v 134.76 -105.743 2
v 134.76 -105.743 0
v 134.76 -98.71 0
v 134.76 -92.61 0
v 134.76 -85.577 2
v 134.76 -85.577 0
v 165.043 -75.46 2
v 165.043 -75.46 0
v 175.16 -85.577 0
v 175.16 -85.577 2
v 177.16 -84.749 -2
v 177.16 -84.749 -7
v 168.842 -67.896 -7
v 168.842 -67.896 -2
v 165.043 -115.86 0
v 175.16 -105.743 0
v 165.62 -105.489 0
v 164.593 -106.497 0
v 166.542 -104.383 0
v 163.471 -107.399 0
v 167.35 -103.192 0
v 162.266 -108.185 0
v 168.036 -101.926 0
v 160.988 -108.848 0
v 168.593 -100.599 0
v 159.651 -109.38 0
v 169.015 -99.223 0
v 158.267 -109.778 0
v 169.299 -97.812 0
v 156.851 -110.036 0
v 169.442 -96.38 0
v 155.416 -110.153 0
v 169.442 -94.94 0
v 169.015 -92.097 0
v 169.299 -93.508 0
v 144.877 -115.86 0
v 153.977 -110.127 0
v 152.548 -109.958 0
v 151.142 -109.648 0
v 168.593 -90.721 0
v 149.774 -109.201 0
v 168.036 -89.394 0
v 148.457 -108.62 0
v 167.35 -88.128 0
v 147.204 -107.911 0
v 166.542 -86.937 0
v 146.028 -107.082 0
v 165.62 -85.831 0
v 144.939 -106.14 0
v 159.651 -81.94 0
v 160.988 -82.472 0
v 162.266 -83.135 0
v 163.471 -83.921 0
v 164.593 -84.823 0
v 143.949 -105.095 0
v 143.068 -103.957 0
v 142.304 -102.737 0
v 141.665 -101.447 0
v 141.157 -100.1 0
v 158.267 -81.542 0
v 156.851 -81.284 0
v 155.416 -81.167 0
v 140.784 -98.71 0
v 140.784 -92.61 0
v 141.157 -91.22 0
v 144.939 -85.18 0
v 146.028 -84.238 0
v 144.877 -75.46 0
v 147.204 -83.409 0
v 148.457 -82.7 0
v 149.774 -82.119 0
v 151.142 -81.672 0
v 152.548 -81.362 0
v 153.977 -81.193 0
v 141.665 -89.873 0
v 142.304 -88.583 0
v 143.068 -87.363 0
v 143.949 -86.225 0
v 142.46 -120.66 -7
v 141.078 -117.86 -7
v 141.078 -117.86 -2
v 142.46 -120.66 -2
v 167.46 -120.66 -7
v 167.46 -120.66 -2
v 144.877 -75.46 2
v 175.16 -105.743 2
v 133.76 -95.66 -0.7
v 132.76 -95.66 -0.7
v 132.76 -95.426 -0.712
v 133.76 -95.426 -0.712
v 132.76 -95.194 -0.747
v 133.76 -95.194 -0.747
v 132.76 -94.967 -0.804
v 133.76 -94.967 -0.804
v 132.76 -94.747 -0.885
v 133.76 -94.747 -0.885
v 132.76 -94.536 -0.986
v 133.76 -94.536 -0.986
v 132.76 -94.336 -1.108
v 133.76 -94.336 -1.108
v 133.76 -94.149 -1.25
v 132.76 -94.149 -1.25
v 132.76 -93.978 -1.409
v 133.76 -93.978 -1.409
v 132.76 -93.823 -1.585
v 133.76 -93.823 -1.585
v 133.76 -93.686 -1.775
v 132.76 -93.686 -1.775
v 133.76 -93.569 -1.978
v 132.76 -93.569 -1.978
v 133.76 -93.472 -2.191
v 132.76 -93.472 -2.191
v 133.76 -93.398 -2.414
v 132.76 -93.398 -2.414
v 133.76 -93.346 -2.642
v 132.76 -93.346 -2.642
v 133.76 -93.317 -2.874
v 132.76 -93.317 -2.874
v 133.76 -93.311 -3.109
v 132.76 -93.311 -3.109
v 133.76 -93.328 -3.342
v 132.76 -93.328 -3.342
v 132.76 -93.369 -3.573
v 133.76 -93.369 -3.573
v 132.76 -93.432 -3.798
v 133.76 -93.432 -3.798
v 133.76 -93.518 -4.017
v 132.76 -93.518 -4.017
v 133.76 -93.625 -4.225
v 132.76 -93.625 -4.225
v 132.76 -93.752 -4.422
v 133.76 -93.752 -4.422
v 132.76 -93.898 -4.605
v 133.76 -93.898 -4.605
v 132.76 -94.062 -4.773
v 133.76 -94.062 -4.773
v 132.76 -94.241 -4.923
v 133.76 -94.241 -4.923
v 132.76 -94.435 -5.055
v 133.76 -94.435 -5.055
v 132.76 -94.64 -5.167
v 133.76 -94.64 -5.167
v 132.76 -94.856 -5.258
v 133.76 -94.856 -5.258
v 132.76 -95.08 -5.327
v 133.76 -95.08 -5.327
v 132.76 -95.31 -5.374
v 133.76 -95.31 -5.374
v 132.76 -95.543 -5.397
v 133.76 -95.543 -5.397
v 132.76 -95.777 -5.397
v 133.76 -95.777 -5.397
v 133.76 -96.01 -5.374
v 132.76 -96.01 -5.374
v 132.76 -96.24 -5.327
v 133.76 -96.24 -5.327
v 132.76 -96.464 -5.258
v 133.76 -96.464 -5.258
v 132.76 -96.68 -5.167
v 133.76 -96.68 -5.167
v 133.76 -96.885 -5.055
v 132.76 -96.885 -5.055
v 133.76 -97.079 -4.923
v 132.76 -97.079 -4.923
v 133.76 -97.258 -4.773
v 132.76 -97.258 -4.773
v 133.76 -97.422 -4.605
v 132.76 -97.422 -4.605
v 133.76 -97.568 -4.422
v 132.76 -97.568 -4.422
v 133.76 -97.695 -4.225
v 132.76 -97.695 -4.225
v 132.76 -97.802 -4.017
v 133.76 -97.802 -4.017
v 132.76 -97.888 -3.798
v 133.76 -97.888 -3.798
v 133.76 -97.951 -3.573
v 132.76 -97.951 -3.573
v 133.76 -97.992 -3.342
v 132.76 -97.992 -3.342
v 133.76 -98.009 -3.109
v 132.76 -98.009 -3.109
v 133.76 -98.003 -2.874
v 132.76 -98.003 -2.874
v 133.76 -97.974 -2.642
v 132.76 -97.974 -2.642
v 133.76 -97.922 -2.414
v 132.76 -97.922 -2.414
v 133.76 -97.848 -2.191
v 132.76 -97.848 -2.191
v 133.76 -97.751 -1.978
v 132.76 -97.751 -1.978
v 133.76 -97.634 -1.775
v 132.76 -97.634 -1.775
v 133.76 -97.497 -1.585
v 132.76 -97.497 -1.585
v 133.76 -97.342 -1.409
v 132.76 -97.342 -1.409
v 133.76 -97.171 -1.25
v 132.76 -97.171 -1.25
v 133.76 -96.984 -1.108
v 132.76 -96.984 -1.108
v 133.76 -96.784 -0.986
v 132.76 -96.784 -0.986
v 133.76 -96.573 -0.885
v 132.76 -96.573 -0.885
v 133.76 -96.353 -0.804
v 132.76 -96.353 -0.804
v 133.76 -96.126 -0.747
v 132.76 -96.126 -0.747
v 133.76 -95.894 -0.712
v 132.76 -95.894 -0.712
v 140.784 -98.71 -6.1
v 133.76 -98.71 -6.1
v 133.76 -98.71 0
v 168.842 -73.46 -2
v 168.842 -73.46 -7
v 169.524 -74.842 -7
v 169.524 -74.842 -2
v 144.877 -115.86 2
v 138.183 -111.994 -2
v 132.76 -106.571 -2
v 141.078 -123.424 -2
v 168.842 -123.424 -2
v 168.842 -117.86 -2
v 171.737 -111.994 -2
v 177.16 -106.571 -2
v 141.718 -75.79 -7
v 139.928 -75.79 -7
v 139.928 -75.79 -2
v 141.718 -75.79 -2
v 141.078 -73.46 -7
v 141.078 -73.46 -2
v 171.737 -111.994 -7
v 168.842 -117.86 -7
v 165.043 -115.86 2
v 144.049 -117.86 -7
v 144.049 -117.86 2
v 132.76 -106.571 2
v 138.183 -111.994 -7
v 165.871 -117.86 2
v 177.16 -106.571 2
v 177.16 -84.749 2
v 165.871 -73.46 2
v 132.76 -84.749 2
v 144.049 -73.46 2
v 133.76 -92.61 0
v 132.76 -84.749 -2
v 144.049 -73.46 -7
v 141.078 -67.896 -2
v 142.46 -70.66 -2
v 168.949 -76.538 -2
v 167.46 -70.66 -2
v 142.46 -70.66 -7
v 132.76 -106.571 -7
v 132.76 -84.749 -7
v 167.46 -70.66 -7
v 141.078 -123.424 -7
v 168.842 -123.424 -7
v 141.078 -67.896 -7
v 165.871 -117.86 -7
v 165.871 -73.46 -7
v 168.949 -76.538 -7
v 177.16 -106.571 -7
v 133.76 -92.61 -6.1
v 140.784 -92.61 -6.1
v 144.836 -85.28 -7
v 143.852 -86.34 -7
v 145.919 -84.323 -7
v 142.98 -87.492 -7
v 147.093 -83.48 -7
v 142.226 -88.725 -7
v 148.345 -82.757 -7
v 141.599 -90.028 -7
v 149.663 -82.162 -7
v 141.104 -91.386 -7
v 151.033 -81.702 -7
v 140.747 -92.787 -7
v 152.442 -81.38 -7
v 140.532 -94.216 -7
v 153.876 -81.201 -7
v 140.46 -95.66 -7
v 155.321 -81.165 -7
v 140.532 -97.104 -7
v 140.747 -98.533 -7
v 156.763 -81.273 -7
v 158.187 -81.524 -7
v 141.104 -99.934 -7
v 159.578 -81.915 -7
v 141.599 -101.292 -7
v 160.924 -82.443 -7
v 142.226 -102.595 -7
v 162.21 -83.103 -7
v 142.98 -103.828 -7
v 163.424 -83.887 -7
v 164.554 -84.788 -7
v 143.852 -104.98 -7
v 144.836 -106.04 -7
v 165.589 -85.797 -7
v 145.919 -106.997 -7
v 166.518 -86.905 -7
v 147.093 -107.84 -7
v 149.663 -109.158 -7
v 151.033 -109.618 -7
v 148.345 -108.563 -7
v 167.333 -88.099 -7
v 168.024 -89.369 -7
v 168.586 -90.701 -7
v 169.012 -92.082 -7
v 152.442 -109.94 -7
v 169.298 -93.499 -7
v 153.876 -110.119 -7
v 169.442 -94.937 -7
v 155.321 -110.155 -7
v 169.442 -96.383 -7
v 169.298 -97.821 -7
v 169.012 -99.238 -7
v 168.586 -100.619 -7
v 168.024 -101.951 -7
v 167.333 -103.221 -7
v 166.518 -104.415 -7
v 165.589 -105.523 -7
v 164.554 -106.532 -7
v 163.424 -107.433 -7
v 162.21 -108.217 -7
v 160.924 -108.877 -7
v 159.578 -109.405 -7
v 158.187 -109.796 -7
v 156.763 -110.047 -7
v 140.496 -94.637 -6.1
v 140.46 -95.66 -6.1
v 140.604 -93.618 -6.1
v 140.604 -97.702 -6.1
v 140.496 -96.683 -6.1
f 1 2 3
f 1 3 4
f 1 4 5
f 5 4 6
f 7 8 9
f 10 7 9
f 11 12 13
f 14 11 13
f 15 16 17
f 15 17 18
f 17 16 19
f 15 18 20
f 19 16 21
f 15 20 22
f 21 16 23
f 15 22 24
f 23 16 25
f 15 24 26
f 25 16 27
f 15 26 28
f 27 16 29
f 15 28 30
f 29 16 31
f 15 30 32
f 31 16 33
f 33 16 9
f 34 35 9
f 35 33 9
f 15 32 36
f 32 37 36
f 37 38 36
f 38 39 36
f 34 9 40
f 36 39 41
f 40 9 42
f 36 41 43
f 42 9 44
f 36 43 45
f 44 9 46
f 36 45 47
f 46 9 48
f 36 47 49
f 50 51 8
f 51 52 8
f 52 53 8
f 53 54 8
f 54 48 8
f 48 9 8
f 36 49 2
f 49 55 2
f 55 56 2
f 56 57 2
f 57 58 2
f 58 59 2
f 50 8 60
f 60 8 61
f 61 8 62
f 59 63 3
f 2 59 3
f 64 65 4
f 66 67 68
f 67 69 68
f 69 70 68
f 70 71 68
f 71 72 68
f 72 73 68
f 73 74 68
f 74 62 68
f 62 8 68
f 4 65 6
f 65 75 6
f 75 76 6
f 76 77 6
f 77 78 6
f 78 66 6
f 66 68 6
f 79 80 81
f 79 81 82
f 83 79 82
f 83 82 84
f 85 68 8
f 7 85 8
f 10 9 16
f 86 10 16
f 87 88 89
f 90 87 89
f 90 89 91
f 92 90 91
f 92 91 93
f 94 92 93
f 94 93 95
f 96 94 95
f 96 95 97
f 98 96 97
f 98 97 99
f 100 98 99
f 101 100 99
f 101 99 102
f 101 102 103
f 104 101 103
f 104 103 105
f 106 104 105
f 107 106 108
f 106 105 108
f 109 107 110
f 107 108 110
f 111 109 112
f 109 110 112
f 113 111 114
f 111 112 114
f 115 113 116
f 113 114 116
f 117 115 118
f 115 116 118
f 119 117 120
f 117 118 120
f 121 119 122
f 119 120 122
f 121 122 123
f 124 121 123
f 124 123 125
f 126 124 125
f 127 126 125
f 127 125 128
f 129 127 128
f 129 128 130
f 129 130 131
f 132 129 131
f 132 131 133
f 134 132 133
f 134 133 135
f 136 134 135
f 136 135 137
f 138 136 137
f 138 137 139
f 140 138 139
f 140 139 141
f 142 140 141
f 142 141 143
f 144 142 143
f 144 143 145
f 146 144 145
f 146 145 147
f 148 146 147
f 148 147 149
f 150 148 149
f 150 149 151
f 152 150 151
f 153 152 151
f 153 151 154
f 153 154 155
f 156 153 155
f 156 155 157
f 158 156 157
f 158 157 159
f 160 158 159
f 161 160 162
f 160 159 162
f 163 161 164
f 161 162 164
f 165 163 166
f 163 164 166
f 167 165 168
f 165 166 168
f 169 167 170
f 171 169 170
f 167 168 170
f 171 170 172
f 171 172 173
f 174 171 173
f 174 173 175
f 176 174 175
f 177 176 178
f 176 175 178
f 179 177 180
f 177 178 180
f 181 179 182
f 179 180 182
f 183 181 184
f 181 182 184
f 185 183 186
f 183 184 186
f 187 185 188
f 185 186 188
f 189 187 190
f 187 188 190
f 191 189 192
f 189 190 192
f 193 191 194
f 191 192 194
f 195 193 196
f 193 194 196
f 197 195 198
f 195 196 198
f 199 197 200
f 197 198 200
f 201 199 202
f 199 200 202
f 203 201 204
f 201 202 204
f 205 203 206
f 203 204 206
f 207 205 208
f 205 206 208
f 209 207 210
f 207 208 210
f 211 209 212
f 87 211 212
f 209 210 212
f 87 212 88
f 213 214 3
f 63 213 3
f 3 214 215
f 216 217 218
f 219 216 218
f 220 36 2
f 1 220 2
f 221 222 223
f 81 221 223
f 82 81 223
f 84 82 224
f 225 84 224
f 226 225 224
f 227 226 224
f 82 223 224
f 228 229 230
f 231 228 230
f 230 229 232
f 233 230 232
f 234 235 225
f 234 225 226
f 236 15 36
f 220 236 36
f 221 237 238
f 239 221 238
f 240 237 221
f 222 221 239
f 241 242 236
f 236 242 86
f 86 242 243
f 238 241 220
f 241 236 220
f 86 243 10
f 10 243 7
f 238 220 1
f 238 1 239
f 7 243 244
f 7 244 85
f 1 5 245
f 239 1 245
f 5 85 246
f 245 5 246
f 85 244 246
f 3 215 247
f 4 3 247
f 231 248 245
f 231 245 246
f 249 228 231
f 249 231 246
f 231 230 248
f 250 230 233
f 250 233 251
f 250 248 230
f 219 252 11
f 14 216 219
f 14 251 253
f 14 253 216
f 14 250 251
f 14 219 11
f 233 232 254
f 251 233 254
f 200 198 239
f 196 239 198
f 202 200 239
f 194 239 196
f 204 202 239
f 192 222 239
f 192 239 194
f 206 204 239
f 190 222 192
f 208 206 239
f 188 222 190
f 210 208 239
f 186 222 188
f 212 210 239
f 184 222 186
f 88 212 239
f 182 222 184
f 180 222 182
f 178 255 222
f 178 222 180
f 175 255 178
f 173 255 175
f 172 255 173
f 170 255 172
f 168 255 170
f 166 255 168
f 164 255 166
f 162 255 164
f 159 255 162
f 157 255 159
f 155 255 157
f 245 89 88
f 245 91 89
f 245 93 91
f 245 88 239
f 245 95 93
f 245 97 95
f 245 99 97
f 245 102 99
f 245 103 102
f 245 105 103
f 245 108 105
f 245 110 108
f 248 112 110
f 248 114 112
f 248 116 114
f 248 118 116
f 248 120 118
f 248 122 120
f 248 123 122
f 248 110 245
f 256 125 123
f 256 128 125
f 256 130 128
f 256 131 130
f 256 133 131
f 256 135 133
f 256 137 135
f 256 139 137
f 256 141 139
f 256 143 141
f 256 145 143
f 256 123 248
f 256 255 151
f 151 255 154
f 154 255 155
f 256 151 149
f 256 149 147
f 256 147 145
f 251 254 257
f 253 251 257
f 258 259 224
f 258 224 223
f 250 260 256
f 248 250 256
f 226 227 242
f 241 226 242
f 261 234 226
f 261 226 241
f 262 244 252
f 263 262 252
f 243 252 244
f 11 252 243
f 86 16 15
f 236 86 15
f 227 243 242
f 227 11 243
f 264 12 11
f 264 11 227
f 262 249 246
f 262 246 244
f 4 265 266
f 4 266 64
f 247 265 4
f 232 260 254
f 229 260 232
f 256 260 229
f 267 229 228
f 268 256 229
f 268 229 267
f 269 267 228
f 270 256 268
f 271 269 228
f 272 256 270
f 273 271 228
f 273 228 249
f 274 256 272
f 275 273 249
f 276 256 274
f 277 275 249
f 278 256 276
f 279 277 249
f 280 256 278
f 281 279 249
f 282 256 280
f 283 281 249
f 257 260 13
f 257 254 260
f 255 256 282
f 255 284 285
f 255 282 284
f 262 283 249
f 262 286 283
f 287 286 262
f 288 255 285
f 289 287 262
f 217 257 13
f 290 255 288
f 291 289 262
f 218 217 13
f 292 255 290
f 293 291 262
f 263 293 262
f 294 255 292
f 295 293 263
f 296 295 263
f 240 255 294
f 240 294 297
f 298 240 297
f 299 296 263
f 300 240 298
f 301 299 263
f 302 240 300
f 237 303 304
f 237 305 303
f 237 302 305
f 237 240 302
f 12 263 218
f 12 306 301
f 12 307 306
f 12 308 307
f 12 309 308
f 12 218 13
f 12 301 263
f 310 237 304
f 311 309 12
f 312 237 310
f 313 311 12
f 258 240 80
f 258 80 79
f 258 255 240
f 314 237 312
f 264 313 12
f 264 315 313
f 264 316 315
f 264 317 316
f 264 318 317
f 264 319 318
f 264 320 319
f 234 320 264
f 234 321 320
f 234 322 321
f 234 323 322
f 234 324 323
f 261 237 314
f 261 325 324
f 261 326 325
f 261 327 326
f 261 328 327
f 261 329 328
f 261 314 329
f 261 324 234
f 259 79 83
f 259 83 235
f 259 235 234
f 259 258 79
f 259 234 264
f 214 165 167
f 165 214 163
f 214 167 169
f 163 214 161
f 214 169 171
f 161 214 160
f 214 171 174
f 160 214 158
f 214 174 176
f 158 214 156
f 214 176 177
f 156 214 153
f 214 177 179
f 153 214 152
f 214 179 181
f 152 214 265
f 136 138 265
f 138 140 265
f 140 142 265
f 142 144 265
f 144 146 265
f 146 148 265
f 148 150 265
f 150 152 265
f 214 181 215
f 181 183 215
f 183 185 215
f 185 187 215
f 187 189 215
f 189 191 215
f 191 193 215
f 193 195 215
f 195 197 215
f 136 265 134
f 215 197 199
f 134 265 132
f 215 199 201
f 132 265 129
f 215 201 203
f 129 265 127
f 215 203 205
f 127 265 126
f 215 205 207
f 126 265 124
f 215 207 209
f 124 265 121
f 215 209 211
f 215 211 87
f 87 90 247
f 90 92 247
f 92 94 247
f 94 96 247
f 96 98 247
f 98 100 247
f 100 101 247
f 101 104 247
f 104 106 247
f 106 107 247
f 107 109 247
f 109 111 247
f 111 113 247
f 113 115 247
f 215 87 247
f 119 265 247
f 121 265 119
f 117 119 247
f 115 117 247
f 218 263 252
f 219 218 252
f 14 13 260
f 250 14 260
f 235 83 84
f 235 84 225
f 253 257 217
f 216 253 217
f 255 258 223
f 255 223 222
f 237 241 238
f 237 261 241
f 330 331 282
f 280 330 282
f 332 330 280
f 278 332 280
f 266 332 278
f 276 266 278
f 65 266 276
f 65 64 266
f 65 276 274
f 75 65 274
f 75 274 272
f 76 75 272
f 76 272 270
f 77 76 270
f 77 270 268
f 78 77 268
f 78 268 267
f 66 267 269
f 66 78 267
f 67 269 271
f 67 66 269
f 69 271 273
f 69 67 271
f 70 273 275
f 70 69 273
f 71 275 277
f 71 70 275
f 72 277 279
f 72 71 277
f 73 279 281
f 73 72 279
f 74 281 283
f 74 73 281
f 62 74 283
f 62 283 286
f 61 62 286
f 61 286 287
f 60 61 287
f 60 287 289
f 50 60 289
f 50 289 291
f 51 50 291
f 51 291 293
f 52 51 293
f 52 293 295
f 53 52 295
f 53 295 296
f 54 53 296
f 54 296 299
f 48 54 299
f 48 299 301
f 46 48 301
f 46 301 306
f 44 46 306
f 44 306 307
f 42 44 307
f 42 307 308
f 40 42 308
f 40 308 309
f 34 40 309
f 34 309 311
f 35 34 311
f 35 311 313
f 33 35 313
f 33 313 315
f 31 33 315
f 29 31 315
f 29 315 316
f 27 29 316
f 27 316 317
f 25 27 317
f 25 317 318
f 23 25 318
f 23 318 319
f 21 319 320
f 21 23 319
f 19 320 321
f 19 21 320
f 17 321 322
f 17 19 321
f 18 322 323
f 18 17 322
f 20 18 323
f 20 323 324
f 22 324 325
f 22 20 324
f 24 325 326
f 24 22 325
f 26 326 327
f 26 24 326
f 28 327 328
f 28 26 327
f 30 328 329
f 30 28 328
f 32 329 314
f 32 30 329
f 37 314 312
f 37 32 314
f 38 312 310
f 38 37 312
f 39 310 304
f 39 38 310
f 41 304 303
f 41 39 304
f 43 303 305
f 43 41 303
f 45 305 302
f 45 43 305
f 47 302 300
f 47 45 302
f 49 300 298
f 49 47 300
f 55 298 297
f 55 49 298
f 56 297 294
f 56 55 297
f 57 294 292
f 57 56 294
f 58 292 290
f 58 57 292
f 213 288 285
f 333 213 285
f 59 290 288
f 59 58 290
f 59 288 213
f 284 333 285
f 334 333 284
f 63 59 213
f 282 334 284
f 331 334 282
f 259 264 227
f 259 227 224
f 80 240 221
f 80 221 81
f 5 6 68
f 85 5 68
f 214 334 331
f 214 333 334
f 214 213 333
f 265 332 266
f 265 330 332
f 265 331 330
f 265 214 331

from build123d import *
from OCP.BRepFilletAPI import BRepFilletAPI_MakeChamfer

# Parameters (mm, degrees)
SKETCH1_R               = 14.5
BOSS_EXTRUDE1_DEPTH     = 7
BOSS_EXTRUDE2_DEPTH     = 2
BOSS_EXTRUDE3_DEPTH     = 5
CHAMFER1_SIZE           = 5
CHAMFER1_SIZE2          = 3.942733198
CUT_EXTRUDE1_REACH      = 134.354
CUT_EXTRUDE1_END_RADIUS = 14.5
CUT_EXTRUDE1_START      = -1
SKETCH3_W               = 6.1
SKETCH3_H               = 6.1
SKETCH3_R               = 2.35
SKETCH3_3_R             = 2.35
CUT_EXTRUDE2_DEPTH      = 5


with BuildPart() as part:
    # Sketch1 → Boss-Extrude1 (new body)
    with BuildSketch(Plane(origin=(0, 0, 0), x_dir=(-1, 0, 0), z_dir=(0, 0, -1))):
        Polygon((-132.76, -106.571268837), (-132.76, -84.748729163), (-144.048730163, -73.459999), (-165.871269837, -73.459999), (-177.16, -84.748729163), (-177.16, -106.571268837), (-165.871269837, -117.859999), (-144.048730163, -117.859999), align=None)
        with Locations((-154.96, -95.659999)):
            Circle(SKETCH1_R, mode=Mode.SUBTRACT)
    extrude(amount=BOSS_EXTRUDE1_DEPTH)

    # Sketch1<3> → Boss-Extrude2 (add)
    with BuildSketch(Plane(origin=(0, 0, 0), x_dir=(-1, 0, 0), z_dir=(0, 0, -1))):
        Polygon((-165.871269837, -117.859999), (-144.048730163, -117.859999), (-132.76, -106.571268837), (-132.76, -84.748729163), (-144.048730163, -73.459999), (-165.871269837, -73.459999), (-177.16, -84.748729163), (-177.16, -106.571268837), align=None)
        Polygon((-134.76, -85.577156288), (-144.877157288, -75.459999), (-165.042842712, -75.459999), (-175.16, -85.577156288), (-175.16, -105.742841712), (-165.042842712, -115.859999), (-144.877157288, -115.859999), (-134.76, -105.742841712), align=None, mode=Mode.SUBTRACT)
    extrude(amount=-BOSS_EXTRUDE2_DEPTH)

    # Sketch2 → Boss-Extrude3 (add)
    with BuildSketch(Plane.XY.offset(-7)):
        Polygon((142.46, -70.659999), (167.46, -70.659999), (168.84199674, -73.459999), (171.737289726, -79.326018889), (177.16, -84.748729163), (168.84199674, -67.896005521), (141.07800326, -67.896005521), (132.76, -84.748729163), (138.182710274, -79.326018889), (141.07800326, -73.459999), align=None)
    boss_extrude3 = extrude(amount=BOSS_EXTRUDE3_DEPTH)

    # Chamfer1: one chamfer whose edges measure the first distance from different faces: ONE call of the kernel's chamfer builder (chamfer() names one face for all edges)
    chamfer1_edges_1 = [part.edges().sort_by_distance(p)[0] for p in [
        (171.737289726, -79.326018889, -4.5),
    ]]
    chamfer1_side_1 = [part.faces().sort_by_distance(p)[0] for p in [
        (169.598644863, -74.993008944, -4.5),
    ]]
    chamfer1_edges_2 = [part.edges().sort_by_distance(p)[0] for p in [
        (138.182710274, -79.326018889, -4.5),
    ]]
    chamfer1_side_2 = [part.faces().sort_by_distance(p)[0] for p in [
        (139.472020238, -78.036708925, -1.77197304),
    ]]
    chamfer1 = BRepFilletAPI_MakeChamfer(part.part.solid().wrapped)
    for e in chamfer1_edges_1:
        chamfer1.Add(CHAMFER1_SIZE, CHAMFER1_SIZE2, e.wrapped, chamfer1_side_1[0].wrapped)  # the first distance lies on this face
    for e in chamfer1_edges_2:
        chamfer1.Add(CHAMFER1_SIZE, CHAMFER1_SIZE2, e.wrapped, chamfer1_side_2[0].wrapped)  # the first distance lies on this face
    add(Compound.cast(chamfer1.Shape()), mode=Mode.REPLACE)

    # Mirror1: Boss-Extrude3 across plane
    add(boss_extrude3.mirror(Plane(origin=(0, -95.659999, 0), x_dir=(0, 0, 1), z_dir=(0, -1, 0))))

    # Cut-Extrude1: up to this cylinder (the profile starts outside it)
    cut_extrude1_end = Plane(origin=(154.96, -95.659999, -1.5681335), z_dir=(0, 0, 1)) * Cylinder(CUT_EXTRUDE1_END_RADIUS, 301.671733, mode=Mode.PRIVATE)
    # Sketch3 → Cut-Extrude1 (cut, up to the surface)
    with BuildSketch(Plane.ZY.offset(-132.76).offset(CUT_EXTRUDE1_START), mode=Mode.PRIVATE) as cut_extrude1_sk1:
        with Locations((-3.05, -95.659999)):
            Rectangle(SKETCH3_W, SKETCH3_H)
        with Locations((-3.05, -95.659999)):
            Circle(SKETCH3_R, mode=Mode.SUBTRACT)
    cut_extrude1_tool1 = extrude(cut_extrude1_sk1.sketch, amount=-CUT_EXTRUDE1_REACH, mode=Mode.PRIVATE) - cut_extrude1_end
    add(cut_extrude1_tool1.solids().sort_by_distance((133.76, -95.659999, -0.086267))[0], mode=Mode.SUBTRACT)
    # Sketch3 → Cut-Extrude1 (cut, up to the surface)
    with BuildSketch(Plane.ZY.offset(-132.76).offset(CUT_EXTRUDE1_START), mode=Mode.PRIVATE) as cut_extrude1_sk2:
        with Locations((-3.05, -95.659999)):
            Circle(SKETCH3_R)
    cut_extrude1_tool2 = extrude(cut_extrude1_sk2.sketch, amount=-CUT_EXTRUDE1_REACH, mode=Mode.PRIVATE) - cut_extrude1_end
    add(cut_extrude1_tool2.solids().sort_by_distance((133.76, -95.659999, -3.05))[0], mode=Mode.SUBTRACT)

    # Sketch3<3> → Cut-Extrude2 (cut)
    with BuildSketch(Plane.ZY.offset(-132.76)):
        with Locations((-3.05, -95.659999)):
            Circle(SKETCH3_3_R)
    extrude(amount=-CUT_EXTRUDE2_DEPTH, mode=Mode.SUBTRACT)


solid = part.part
